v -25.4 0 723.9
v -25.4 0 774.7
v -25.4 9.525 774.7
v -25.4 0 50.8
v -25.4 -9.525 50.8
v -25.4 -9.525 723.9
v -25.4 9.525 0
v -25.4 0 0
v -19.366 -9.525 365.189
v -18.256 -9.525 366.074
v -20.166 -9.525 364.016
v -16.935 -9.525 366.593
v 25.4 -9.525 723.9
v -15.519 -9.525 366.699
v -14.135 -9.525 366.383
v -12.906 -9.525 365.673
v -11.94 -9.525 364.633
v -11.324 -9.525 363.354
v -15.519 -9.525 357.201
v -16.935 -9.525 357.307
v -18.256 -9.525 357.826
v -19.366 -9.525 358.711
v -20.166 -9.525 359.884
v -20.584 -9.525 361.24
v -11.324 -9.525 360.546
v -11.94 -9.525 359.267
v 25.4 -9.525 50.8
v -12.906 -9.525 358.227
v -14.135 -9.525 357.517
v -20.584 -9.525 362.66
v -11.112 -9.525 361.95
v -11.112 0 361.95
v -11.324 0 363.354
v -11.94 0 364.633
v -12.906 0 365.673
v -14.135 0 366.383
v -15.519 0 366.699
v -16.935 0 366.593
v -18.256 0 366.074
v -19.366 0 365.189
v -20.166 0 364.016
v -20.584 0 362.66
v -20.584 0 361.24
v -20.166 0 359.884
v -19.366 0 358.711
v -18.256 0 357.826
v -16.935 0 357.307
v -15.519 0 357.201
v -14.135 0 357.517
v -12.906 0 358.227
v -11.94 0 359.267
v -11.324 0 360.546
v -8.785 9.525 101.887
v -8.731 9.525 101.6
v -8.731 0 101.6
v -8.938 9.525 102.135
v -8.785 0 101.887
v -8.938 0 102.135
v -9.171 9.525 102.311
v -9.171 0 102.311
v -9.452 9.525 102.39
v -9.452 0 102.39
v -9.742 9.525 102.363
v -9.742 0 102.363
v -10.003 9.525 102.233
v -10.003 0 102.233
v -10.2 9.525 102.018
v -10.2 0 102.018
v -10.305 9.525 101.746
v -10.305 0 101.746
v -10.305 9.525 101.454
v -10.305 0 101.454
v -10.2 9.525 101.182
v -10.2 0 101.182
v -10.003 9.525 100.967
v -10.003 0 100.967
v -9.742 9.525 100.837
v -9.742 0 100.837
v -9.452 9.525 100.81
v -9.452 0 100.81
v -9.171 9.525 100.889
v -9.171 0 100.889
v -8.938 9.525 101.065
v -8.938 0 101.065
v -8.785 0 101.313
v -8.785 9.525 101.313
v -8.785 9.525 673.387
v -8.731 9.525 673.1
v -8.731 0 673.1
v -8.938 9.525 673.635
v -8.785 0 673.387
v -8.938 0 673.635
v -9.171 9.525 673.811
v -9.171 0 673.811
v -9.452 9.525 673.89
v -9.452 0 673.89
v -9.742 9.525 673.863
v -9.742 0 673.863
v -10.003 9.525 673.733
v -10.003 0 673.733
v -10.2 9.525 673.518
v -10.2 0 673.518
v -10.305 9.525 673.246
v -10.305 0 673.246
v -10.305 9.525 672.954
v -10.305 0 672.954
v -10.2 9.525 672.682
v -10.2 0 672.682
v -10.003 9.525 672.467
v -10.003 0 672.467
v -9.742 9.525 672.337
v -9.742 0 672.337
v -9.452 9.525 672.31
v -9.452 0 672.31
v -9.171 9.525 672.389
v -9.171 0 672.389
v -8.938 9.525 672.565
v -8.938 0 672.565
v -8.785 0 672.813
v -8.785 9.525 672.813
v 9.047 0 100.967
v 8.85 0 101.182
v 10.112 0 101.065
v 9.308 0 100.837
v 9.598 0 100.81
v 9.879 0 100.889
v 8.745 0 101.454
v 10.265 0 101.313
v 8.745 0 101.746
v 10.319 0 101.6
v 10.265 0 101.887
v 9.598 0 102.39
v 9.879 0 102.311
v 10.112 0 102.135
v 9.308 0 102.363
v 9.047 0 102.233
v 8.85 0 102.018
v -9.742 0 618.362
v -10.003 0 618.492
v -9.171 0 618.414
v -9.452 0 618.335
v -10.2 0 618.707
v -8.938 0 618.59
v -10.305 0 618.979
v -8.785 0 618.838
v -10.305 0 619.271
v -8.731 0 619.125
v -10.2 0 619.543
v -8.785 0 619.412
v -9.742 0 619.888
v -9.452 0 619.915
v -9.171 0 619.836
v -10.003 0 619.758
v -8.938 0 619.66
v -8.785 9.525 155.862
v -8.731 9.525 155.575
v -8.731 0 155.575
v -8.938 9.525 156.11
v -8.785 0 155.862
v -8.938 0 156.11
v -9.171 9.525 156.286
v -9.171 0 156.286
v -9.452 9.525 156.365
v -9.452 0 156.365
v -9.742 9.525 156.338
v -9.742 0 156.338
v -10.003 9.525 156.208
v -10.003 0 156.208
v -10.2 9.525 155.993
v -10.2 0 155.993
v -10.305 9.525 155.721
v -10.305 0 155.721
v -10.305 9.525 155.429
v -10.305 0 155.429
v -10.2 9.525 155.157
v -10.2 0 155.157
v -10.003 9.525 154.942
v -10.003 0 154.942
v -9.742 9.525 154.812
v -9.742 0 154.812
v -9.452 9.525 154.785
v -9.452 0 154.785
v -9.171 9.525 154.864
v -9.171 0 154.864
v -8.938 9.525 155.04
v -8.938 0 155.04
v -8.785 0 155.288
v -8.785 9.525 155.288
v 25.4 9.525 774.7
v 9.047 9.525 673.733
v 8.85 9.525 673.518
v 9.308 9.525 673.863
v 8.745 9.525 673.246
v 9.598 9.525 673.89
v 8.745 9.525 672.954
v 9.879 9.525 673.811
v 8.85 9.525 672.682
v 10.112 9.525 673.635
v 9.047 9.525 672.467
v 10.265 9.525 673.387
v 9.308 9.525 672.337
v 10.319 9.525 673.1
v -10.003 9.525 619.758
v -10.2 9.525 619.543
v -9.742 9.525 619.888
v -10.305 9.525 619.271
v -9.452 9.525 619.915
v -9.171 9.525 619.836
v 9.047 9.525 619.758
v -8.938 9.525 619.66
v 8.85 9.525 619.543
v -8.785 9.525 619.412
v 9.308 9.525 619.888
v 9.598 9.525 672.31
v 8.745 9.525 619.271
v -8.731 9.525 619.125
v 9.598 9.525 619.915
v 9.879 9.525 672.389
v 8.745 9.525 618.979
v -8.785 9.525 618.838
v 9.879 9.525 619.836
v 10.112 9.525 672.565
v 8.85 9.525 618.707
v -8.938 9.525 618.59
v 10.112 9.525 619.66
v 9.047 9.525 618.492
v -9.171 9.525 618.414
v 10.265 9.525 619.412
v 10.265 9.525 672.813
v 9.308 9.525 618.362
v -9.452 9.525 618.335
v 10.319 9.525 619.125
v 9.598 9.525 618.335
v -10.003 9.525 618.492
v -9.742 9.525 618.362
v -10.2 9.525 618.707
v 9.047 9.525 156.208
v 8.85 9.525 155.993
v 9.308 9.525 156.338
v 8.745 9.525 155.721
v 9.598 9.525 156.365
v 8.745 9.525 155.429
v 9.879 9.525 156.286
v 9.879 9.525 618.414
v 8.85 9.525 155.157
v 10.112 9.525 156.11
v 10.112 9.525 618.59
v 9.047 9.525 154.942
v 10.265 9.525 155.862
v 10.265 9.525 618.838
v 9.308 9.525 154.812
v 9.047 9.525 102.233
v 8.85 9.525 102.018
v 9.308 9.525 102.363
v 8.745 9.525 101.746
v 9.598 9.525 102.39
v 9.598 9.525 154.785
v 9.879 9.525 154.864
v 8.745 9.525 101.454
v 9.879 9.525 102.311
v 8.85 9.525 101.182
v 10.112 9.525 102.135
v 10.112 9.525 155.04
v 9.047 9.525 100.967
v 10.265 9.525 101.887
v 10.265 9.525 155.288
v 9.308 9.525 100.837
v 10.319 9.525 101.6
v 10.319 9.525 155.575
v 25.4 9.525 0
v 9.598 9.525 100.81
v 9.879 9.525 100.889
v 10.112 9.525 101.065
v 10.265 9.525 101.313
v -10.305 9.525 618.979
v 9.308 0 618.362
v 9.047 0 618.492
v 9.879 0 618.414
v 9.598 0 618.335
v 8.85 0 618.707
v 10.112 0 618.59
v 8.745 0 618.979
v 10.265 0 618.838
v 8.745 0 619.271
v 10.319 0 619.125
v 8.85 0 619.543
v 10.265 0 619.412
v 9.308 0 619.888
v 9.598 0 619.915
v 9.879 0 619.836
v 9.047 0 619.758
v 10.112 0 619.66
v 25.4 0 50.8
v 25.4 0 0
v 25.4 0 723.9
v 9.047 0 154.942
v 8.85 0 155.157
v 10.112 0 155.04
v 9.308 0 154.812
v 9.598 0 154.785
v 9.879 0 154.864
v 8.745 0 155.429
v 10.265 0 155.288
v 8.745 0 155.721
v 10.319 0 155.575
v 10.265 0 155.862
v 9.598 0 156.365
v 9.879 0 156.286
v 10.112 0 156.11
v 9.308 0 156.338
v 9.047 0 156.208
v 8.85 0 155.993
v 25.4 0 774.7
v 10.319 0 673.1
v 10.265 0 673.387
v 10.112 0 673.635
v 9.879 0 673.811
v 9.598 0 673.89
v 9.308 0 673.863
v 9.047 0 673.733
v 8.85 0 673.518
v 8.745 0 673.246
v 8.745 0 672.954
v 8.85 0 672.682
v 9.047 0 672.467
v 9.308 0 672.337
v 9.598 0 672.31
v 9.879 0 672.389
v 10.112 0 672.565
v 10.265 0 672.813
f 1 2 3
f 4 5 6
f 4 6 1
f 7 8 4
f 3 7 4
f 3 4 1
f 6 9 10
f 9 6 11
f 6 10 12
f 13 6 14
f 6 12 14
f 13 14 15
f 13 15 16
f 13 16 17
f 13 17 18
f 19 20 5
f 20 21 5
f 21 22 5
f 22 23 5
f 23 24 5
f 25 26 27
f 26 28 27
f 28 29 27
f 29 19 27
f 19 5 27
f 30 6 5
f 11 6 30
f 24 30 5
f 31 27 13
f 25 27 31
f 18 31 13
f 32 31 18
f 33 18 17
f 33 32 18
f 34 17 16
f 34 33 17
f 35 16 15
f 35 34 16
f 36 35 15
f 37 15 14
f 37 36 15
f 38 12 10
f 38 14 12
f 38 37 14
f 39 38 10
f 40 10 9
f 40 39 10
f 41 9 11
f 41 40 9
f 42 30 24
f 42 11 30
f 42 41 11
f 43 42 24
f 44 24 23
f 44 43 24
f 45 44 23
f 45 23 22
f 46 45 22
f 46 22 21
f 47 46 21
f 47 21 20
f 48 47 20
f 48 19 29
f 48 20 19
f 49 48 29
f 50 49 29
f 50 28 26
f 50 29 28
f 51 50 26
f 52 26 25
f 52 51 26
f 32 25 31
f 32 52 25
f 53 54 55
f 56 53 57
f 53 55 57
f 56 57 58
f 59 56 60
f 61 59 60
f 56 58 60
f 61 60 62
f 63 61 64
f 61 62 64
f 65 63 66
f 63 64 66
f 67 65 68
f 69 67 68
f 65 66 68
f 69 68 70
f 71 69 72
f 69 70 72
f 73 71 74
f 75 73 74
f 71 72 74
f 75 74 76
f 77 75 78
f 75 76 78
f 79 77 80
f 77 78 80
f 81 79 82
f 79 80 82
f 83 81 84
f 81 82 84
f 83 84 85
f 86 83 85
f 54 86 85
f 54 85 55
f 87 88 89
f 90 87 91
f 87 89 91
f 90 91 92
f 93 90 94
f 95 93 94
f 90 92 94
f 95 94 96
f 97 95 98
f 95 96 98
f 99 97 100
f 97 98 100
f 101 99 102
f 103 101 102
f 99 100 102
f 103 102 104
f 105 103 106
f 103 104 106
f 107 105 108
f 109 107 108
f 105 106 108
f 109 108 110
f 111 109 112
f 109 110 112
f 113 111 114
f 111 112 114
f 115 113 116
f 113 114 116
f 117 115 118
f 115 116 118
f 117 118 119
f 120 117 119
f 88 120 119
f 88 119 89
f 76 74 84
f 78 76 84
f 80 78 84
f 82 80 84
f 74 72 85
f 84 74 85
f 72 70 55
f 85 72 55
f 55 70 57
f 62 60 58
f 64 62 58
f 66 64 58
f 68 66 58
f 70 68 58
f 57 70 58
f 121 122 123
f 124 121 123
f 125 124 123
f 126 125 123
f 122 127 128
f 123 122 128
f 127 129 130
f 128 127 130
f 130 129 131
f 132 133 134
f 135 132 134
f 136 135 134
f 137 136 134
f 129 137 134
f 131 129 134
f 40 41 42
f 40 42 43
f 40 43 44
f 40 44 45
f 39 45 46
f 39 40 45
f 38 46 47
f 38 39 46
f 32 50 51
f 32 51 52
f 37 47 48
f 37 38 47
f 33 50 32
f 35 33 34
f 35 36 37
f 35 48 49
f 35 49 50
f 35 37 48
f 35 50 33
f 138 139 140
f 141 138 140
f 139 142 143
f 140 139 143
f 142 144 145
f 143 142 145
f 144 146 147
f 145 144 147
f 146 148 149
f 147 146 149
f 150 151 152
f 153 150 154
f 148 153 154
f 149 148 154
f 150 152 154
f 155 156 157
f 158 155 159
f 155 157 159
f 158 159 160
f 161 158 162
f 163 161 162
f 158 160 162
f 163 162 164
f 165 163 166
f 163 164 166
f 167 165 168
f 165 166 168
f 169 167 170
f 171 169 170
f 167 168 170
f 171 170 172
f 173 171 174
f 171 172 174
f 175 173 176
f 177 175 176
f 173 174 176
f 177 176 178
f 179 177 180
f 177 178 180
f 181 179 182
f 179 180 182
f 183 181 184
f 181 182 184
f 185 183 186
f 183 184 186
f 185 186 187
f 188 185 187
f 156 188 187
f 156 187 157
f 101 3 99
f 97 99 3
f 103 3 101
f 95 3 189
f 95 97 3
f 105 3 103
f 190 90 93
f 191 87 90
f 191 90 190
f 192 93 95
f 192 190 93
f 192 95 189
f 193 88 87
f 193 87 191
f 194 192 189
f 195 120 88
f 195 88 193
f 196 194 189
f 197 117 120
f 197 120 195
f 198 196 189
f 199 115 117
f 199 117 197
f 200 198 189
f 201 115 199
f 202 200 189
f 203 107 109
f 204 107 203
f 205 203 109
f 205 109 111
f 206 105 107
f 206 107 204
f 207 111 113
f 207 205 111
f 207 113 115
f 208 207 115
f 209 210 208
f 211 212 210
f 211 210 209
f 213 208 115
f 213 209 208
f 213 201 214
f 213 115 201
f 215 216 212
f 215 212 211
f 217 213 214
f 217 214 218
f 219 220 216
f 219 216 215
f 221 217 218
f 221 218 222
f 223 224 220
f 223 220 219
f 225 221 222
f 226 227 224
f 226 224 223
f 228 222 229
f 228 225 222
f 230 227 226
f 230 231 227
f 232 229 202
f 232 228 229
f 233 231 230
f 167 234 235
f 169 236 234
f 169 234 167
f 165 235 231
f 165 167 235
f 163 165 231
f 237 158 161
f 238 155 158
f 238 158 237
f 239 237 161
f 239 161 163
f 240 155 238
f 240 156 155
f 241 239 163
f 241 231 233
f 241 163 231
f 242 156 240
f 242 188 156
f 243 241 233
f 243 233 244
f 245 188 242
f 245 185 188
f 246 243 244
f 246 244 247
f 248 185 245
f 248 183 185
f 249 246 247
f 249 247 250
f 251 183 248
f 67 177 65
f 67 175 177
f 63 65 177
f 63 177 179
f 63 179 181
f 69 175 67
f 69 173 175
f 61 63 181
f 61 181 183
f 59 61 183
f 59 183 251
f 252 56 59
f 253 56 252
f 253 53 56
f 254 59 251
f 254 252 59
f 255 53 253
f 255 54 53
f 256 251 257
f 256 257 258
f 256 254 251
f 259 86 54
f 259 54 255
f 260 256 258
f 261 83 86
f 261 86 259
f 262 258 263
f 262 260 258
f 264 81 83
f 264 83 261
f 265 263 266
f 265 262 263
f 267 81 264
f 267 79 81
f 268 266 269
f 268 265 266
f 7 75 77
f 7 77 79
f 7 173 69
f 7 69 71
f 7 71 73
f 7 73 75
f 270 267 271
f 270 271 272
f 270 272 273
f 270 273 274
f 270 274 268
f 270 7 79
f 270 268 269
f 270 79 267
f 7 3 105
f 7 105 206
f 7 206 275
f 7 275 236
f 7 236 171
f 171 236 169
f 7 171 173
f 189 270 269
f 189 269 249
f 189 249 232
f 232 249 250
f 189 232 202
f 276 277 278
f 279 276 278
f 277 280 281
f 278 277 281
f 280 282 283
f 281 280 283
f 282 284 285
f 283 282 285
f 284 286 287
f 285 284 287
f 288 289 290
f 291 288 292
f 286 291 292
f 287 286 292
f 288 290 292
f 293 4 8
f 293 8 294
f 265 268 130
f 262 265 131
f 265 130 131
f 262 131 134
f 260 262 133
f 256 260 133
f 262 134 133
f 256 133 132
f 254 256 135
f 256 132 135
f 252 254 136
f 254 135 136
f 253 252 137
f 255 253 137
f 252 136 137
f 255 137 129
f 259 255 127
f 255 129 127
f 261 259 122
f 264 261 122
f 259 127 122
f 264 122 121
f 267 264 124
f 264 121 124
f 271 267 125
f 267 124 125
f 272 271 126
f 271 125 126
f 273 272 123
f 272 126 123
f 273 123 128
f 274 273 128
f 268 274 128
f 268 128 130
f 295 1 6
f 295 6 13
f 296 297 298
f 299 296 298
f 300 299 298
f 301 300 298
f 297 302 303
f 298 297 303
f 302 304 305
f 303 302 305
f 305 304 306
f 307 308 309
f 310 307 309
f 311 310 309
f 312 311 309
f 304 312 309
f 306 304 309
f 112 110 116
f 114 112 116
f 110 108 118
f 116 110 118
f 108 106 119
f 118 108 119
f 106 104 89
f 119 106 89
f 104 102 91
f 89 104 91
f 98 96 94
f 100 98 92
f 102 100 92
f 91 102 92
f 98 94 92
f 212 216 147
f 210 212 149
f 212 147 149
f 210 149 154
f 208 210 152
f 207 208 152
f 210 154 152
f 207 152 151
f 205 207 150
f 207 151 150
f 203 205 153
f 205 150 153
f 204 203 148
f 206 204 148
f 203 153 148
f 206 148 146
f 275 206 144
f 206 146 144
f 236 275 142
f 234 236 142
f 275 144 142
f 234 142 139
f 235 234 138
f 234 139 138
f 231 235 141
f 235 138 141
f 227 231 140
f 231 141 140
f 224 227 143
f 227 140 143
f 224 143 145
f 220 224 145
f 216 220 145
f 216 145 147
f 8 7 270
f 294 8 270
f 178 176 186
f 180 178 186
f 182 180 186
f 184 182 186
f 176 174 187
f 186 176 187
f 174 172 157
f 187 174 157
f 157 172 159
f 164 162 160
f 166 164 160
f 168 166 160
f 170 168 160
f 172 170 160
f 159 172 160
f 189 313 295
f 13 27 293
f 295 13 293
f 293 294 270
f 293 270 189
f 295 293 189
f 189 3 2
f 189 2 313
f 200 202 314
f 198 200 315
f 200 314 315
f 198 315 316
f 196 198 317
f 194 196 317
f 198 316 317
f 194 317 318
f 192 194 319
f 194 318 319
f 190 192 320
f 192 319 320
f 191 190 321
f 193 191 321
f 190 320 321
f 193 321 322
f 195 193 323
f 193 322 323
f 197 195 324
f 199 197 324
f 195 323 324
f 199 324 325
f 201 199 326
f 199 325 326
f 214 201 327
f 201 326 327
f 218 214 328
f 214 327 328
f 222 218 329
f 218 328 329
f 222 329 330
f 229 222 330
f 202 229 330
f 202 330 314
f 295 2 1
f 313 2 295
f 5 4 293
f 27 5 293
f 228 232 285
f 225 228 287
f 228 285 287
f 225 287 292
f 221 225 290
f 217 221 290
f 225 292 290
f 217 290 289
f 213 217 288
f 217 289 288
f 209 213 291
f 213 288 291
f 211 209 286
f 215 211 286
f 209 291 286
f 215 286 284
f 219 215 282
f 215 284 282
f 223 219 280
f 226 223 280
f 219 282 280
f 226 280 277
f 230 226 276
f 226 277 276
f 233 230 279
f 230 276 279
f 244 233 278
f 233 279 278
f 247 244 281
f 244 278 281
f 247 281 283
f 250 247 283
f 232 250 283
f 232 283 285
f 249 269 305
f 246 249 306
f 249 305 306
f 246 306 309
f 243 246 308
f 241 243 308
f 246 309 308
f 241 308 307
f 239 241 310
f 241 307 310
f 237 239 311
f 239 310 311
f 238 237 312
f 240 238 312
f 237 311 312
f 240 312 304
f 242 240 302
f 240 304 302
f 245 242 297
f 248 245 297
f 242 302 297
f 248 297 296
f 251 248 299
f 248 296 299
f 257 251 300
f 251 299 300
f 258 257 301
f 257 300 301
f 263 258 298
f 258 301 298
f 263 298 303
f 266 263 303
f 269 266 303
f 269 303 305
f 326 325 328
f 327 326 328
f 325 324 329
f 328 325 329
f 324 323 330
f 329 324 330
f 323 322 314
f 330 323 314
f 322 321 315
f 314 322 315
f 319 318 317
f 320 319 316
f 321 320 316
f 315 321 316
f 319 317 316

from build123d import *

# Parameters (mm, degrees)
F0_W     = 50.8
F0_H     = 19.05
F1_DEPTH = 774.7
F2_W     = 122.43557321
F2_H     = 50.8
F2_W_2   = 343.1604206562
F3_DEPTH = 25.4
F4_R     = 0.79375
F5_DEPTH = 25.4
F6_R     = 4.7625
F7_DEPTH = 25.4


# Not quite as in the source:
# - a feature names something its author has since deleted; it is built from what else it names


with BuildPart() as f1:
    # F0 (on Top) → F1 (new body)
    with BuildSketch(Plane.XY):
        Rectangle(F0_W, F0_H)
    extrude(amount=F1_DEPTH)

    # F2 (on Front) → F3 (cut)
    with BuildSketch(Plane.XZ):
        with Locations((22.4465244144, 25.4)):
            Rectangle(F2_W, F2_H)
        with Locations((-38.7818217278, 749.3)):
            Rectangle(F2_W_2, F2_H)
    extrude(amount=F3_DEPTH, mode=Mode.SUBTRACT)

    # F4 (on Front) → F5 (cut)
    with BuildSketch(Plane.XZ):
        with Locations((9.525, 101.6)):
            Circle(F4_R)
        with Locations((9.525, 155.575)):
            Circle(F4_R)
        with Locations((9.525, 619.125)):
            Circle(F4_R)
        with Locations((9.525, 673.1)):
            Circle(F4_R)
        with Locations((-9.525, 619.125)):
            Circle(F4_R)
        with Locations((-9.525, 673.1)):
            Circle(F4_R)
        with Locations((-9.525, 101.6)):
            Circle(F4_R)
        with Locations((-9.525, 155.575)):
            Circle(F4_R)
    extrude(amount=-F5_DEPTH, mode=Mode.SUBTRACT)

    # F6 (on Front) → F7 (cut)
    with BuildSketch(Plane.XZ):
        with Locations((-15.875, 361.95)):
            Circle(F6_R)
    extrude(amount=F7_DEPTH, mode=Mode.SUBTRACT)


solid = f1.part
